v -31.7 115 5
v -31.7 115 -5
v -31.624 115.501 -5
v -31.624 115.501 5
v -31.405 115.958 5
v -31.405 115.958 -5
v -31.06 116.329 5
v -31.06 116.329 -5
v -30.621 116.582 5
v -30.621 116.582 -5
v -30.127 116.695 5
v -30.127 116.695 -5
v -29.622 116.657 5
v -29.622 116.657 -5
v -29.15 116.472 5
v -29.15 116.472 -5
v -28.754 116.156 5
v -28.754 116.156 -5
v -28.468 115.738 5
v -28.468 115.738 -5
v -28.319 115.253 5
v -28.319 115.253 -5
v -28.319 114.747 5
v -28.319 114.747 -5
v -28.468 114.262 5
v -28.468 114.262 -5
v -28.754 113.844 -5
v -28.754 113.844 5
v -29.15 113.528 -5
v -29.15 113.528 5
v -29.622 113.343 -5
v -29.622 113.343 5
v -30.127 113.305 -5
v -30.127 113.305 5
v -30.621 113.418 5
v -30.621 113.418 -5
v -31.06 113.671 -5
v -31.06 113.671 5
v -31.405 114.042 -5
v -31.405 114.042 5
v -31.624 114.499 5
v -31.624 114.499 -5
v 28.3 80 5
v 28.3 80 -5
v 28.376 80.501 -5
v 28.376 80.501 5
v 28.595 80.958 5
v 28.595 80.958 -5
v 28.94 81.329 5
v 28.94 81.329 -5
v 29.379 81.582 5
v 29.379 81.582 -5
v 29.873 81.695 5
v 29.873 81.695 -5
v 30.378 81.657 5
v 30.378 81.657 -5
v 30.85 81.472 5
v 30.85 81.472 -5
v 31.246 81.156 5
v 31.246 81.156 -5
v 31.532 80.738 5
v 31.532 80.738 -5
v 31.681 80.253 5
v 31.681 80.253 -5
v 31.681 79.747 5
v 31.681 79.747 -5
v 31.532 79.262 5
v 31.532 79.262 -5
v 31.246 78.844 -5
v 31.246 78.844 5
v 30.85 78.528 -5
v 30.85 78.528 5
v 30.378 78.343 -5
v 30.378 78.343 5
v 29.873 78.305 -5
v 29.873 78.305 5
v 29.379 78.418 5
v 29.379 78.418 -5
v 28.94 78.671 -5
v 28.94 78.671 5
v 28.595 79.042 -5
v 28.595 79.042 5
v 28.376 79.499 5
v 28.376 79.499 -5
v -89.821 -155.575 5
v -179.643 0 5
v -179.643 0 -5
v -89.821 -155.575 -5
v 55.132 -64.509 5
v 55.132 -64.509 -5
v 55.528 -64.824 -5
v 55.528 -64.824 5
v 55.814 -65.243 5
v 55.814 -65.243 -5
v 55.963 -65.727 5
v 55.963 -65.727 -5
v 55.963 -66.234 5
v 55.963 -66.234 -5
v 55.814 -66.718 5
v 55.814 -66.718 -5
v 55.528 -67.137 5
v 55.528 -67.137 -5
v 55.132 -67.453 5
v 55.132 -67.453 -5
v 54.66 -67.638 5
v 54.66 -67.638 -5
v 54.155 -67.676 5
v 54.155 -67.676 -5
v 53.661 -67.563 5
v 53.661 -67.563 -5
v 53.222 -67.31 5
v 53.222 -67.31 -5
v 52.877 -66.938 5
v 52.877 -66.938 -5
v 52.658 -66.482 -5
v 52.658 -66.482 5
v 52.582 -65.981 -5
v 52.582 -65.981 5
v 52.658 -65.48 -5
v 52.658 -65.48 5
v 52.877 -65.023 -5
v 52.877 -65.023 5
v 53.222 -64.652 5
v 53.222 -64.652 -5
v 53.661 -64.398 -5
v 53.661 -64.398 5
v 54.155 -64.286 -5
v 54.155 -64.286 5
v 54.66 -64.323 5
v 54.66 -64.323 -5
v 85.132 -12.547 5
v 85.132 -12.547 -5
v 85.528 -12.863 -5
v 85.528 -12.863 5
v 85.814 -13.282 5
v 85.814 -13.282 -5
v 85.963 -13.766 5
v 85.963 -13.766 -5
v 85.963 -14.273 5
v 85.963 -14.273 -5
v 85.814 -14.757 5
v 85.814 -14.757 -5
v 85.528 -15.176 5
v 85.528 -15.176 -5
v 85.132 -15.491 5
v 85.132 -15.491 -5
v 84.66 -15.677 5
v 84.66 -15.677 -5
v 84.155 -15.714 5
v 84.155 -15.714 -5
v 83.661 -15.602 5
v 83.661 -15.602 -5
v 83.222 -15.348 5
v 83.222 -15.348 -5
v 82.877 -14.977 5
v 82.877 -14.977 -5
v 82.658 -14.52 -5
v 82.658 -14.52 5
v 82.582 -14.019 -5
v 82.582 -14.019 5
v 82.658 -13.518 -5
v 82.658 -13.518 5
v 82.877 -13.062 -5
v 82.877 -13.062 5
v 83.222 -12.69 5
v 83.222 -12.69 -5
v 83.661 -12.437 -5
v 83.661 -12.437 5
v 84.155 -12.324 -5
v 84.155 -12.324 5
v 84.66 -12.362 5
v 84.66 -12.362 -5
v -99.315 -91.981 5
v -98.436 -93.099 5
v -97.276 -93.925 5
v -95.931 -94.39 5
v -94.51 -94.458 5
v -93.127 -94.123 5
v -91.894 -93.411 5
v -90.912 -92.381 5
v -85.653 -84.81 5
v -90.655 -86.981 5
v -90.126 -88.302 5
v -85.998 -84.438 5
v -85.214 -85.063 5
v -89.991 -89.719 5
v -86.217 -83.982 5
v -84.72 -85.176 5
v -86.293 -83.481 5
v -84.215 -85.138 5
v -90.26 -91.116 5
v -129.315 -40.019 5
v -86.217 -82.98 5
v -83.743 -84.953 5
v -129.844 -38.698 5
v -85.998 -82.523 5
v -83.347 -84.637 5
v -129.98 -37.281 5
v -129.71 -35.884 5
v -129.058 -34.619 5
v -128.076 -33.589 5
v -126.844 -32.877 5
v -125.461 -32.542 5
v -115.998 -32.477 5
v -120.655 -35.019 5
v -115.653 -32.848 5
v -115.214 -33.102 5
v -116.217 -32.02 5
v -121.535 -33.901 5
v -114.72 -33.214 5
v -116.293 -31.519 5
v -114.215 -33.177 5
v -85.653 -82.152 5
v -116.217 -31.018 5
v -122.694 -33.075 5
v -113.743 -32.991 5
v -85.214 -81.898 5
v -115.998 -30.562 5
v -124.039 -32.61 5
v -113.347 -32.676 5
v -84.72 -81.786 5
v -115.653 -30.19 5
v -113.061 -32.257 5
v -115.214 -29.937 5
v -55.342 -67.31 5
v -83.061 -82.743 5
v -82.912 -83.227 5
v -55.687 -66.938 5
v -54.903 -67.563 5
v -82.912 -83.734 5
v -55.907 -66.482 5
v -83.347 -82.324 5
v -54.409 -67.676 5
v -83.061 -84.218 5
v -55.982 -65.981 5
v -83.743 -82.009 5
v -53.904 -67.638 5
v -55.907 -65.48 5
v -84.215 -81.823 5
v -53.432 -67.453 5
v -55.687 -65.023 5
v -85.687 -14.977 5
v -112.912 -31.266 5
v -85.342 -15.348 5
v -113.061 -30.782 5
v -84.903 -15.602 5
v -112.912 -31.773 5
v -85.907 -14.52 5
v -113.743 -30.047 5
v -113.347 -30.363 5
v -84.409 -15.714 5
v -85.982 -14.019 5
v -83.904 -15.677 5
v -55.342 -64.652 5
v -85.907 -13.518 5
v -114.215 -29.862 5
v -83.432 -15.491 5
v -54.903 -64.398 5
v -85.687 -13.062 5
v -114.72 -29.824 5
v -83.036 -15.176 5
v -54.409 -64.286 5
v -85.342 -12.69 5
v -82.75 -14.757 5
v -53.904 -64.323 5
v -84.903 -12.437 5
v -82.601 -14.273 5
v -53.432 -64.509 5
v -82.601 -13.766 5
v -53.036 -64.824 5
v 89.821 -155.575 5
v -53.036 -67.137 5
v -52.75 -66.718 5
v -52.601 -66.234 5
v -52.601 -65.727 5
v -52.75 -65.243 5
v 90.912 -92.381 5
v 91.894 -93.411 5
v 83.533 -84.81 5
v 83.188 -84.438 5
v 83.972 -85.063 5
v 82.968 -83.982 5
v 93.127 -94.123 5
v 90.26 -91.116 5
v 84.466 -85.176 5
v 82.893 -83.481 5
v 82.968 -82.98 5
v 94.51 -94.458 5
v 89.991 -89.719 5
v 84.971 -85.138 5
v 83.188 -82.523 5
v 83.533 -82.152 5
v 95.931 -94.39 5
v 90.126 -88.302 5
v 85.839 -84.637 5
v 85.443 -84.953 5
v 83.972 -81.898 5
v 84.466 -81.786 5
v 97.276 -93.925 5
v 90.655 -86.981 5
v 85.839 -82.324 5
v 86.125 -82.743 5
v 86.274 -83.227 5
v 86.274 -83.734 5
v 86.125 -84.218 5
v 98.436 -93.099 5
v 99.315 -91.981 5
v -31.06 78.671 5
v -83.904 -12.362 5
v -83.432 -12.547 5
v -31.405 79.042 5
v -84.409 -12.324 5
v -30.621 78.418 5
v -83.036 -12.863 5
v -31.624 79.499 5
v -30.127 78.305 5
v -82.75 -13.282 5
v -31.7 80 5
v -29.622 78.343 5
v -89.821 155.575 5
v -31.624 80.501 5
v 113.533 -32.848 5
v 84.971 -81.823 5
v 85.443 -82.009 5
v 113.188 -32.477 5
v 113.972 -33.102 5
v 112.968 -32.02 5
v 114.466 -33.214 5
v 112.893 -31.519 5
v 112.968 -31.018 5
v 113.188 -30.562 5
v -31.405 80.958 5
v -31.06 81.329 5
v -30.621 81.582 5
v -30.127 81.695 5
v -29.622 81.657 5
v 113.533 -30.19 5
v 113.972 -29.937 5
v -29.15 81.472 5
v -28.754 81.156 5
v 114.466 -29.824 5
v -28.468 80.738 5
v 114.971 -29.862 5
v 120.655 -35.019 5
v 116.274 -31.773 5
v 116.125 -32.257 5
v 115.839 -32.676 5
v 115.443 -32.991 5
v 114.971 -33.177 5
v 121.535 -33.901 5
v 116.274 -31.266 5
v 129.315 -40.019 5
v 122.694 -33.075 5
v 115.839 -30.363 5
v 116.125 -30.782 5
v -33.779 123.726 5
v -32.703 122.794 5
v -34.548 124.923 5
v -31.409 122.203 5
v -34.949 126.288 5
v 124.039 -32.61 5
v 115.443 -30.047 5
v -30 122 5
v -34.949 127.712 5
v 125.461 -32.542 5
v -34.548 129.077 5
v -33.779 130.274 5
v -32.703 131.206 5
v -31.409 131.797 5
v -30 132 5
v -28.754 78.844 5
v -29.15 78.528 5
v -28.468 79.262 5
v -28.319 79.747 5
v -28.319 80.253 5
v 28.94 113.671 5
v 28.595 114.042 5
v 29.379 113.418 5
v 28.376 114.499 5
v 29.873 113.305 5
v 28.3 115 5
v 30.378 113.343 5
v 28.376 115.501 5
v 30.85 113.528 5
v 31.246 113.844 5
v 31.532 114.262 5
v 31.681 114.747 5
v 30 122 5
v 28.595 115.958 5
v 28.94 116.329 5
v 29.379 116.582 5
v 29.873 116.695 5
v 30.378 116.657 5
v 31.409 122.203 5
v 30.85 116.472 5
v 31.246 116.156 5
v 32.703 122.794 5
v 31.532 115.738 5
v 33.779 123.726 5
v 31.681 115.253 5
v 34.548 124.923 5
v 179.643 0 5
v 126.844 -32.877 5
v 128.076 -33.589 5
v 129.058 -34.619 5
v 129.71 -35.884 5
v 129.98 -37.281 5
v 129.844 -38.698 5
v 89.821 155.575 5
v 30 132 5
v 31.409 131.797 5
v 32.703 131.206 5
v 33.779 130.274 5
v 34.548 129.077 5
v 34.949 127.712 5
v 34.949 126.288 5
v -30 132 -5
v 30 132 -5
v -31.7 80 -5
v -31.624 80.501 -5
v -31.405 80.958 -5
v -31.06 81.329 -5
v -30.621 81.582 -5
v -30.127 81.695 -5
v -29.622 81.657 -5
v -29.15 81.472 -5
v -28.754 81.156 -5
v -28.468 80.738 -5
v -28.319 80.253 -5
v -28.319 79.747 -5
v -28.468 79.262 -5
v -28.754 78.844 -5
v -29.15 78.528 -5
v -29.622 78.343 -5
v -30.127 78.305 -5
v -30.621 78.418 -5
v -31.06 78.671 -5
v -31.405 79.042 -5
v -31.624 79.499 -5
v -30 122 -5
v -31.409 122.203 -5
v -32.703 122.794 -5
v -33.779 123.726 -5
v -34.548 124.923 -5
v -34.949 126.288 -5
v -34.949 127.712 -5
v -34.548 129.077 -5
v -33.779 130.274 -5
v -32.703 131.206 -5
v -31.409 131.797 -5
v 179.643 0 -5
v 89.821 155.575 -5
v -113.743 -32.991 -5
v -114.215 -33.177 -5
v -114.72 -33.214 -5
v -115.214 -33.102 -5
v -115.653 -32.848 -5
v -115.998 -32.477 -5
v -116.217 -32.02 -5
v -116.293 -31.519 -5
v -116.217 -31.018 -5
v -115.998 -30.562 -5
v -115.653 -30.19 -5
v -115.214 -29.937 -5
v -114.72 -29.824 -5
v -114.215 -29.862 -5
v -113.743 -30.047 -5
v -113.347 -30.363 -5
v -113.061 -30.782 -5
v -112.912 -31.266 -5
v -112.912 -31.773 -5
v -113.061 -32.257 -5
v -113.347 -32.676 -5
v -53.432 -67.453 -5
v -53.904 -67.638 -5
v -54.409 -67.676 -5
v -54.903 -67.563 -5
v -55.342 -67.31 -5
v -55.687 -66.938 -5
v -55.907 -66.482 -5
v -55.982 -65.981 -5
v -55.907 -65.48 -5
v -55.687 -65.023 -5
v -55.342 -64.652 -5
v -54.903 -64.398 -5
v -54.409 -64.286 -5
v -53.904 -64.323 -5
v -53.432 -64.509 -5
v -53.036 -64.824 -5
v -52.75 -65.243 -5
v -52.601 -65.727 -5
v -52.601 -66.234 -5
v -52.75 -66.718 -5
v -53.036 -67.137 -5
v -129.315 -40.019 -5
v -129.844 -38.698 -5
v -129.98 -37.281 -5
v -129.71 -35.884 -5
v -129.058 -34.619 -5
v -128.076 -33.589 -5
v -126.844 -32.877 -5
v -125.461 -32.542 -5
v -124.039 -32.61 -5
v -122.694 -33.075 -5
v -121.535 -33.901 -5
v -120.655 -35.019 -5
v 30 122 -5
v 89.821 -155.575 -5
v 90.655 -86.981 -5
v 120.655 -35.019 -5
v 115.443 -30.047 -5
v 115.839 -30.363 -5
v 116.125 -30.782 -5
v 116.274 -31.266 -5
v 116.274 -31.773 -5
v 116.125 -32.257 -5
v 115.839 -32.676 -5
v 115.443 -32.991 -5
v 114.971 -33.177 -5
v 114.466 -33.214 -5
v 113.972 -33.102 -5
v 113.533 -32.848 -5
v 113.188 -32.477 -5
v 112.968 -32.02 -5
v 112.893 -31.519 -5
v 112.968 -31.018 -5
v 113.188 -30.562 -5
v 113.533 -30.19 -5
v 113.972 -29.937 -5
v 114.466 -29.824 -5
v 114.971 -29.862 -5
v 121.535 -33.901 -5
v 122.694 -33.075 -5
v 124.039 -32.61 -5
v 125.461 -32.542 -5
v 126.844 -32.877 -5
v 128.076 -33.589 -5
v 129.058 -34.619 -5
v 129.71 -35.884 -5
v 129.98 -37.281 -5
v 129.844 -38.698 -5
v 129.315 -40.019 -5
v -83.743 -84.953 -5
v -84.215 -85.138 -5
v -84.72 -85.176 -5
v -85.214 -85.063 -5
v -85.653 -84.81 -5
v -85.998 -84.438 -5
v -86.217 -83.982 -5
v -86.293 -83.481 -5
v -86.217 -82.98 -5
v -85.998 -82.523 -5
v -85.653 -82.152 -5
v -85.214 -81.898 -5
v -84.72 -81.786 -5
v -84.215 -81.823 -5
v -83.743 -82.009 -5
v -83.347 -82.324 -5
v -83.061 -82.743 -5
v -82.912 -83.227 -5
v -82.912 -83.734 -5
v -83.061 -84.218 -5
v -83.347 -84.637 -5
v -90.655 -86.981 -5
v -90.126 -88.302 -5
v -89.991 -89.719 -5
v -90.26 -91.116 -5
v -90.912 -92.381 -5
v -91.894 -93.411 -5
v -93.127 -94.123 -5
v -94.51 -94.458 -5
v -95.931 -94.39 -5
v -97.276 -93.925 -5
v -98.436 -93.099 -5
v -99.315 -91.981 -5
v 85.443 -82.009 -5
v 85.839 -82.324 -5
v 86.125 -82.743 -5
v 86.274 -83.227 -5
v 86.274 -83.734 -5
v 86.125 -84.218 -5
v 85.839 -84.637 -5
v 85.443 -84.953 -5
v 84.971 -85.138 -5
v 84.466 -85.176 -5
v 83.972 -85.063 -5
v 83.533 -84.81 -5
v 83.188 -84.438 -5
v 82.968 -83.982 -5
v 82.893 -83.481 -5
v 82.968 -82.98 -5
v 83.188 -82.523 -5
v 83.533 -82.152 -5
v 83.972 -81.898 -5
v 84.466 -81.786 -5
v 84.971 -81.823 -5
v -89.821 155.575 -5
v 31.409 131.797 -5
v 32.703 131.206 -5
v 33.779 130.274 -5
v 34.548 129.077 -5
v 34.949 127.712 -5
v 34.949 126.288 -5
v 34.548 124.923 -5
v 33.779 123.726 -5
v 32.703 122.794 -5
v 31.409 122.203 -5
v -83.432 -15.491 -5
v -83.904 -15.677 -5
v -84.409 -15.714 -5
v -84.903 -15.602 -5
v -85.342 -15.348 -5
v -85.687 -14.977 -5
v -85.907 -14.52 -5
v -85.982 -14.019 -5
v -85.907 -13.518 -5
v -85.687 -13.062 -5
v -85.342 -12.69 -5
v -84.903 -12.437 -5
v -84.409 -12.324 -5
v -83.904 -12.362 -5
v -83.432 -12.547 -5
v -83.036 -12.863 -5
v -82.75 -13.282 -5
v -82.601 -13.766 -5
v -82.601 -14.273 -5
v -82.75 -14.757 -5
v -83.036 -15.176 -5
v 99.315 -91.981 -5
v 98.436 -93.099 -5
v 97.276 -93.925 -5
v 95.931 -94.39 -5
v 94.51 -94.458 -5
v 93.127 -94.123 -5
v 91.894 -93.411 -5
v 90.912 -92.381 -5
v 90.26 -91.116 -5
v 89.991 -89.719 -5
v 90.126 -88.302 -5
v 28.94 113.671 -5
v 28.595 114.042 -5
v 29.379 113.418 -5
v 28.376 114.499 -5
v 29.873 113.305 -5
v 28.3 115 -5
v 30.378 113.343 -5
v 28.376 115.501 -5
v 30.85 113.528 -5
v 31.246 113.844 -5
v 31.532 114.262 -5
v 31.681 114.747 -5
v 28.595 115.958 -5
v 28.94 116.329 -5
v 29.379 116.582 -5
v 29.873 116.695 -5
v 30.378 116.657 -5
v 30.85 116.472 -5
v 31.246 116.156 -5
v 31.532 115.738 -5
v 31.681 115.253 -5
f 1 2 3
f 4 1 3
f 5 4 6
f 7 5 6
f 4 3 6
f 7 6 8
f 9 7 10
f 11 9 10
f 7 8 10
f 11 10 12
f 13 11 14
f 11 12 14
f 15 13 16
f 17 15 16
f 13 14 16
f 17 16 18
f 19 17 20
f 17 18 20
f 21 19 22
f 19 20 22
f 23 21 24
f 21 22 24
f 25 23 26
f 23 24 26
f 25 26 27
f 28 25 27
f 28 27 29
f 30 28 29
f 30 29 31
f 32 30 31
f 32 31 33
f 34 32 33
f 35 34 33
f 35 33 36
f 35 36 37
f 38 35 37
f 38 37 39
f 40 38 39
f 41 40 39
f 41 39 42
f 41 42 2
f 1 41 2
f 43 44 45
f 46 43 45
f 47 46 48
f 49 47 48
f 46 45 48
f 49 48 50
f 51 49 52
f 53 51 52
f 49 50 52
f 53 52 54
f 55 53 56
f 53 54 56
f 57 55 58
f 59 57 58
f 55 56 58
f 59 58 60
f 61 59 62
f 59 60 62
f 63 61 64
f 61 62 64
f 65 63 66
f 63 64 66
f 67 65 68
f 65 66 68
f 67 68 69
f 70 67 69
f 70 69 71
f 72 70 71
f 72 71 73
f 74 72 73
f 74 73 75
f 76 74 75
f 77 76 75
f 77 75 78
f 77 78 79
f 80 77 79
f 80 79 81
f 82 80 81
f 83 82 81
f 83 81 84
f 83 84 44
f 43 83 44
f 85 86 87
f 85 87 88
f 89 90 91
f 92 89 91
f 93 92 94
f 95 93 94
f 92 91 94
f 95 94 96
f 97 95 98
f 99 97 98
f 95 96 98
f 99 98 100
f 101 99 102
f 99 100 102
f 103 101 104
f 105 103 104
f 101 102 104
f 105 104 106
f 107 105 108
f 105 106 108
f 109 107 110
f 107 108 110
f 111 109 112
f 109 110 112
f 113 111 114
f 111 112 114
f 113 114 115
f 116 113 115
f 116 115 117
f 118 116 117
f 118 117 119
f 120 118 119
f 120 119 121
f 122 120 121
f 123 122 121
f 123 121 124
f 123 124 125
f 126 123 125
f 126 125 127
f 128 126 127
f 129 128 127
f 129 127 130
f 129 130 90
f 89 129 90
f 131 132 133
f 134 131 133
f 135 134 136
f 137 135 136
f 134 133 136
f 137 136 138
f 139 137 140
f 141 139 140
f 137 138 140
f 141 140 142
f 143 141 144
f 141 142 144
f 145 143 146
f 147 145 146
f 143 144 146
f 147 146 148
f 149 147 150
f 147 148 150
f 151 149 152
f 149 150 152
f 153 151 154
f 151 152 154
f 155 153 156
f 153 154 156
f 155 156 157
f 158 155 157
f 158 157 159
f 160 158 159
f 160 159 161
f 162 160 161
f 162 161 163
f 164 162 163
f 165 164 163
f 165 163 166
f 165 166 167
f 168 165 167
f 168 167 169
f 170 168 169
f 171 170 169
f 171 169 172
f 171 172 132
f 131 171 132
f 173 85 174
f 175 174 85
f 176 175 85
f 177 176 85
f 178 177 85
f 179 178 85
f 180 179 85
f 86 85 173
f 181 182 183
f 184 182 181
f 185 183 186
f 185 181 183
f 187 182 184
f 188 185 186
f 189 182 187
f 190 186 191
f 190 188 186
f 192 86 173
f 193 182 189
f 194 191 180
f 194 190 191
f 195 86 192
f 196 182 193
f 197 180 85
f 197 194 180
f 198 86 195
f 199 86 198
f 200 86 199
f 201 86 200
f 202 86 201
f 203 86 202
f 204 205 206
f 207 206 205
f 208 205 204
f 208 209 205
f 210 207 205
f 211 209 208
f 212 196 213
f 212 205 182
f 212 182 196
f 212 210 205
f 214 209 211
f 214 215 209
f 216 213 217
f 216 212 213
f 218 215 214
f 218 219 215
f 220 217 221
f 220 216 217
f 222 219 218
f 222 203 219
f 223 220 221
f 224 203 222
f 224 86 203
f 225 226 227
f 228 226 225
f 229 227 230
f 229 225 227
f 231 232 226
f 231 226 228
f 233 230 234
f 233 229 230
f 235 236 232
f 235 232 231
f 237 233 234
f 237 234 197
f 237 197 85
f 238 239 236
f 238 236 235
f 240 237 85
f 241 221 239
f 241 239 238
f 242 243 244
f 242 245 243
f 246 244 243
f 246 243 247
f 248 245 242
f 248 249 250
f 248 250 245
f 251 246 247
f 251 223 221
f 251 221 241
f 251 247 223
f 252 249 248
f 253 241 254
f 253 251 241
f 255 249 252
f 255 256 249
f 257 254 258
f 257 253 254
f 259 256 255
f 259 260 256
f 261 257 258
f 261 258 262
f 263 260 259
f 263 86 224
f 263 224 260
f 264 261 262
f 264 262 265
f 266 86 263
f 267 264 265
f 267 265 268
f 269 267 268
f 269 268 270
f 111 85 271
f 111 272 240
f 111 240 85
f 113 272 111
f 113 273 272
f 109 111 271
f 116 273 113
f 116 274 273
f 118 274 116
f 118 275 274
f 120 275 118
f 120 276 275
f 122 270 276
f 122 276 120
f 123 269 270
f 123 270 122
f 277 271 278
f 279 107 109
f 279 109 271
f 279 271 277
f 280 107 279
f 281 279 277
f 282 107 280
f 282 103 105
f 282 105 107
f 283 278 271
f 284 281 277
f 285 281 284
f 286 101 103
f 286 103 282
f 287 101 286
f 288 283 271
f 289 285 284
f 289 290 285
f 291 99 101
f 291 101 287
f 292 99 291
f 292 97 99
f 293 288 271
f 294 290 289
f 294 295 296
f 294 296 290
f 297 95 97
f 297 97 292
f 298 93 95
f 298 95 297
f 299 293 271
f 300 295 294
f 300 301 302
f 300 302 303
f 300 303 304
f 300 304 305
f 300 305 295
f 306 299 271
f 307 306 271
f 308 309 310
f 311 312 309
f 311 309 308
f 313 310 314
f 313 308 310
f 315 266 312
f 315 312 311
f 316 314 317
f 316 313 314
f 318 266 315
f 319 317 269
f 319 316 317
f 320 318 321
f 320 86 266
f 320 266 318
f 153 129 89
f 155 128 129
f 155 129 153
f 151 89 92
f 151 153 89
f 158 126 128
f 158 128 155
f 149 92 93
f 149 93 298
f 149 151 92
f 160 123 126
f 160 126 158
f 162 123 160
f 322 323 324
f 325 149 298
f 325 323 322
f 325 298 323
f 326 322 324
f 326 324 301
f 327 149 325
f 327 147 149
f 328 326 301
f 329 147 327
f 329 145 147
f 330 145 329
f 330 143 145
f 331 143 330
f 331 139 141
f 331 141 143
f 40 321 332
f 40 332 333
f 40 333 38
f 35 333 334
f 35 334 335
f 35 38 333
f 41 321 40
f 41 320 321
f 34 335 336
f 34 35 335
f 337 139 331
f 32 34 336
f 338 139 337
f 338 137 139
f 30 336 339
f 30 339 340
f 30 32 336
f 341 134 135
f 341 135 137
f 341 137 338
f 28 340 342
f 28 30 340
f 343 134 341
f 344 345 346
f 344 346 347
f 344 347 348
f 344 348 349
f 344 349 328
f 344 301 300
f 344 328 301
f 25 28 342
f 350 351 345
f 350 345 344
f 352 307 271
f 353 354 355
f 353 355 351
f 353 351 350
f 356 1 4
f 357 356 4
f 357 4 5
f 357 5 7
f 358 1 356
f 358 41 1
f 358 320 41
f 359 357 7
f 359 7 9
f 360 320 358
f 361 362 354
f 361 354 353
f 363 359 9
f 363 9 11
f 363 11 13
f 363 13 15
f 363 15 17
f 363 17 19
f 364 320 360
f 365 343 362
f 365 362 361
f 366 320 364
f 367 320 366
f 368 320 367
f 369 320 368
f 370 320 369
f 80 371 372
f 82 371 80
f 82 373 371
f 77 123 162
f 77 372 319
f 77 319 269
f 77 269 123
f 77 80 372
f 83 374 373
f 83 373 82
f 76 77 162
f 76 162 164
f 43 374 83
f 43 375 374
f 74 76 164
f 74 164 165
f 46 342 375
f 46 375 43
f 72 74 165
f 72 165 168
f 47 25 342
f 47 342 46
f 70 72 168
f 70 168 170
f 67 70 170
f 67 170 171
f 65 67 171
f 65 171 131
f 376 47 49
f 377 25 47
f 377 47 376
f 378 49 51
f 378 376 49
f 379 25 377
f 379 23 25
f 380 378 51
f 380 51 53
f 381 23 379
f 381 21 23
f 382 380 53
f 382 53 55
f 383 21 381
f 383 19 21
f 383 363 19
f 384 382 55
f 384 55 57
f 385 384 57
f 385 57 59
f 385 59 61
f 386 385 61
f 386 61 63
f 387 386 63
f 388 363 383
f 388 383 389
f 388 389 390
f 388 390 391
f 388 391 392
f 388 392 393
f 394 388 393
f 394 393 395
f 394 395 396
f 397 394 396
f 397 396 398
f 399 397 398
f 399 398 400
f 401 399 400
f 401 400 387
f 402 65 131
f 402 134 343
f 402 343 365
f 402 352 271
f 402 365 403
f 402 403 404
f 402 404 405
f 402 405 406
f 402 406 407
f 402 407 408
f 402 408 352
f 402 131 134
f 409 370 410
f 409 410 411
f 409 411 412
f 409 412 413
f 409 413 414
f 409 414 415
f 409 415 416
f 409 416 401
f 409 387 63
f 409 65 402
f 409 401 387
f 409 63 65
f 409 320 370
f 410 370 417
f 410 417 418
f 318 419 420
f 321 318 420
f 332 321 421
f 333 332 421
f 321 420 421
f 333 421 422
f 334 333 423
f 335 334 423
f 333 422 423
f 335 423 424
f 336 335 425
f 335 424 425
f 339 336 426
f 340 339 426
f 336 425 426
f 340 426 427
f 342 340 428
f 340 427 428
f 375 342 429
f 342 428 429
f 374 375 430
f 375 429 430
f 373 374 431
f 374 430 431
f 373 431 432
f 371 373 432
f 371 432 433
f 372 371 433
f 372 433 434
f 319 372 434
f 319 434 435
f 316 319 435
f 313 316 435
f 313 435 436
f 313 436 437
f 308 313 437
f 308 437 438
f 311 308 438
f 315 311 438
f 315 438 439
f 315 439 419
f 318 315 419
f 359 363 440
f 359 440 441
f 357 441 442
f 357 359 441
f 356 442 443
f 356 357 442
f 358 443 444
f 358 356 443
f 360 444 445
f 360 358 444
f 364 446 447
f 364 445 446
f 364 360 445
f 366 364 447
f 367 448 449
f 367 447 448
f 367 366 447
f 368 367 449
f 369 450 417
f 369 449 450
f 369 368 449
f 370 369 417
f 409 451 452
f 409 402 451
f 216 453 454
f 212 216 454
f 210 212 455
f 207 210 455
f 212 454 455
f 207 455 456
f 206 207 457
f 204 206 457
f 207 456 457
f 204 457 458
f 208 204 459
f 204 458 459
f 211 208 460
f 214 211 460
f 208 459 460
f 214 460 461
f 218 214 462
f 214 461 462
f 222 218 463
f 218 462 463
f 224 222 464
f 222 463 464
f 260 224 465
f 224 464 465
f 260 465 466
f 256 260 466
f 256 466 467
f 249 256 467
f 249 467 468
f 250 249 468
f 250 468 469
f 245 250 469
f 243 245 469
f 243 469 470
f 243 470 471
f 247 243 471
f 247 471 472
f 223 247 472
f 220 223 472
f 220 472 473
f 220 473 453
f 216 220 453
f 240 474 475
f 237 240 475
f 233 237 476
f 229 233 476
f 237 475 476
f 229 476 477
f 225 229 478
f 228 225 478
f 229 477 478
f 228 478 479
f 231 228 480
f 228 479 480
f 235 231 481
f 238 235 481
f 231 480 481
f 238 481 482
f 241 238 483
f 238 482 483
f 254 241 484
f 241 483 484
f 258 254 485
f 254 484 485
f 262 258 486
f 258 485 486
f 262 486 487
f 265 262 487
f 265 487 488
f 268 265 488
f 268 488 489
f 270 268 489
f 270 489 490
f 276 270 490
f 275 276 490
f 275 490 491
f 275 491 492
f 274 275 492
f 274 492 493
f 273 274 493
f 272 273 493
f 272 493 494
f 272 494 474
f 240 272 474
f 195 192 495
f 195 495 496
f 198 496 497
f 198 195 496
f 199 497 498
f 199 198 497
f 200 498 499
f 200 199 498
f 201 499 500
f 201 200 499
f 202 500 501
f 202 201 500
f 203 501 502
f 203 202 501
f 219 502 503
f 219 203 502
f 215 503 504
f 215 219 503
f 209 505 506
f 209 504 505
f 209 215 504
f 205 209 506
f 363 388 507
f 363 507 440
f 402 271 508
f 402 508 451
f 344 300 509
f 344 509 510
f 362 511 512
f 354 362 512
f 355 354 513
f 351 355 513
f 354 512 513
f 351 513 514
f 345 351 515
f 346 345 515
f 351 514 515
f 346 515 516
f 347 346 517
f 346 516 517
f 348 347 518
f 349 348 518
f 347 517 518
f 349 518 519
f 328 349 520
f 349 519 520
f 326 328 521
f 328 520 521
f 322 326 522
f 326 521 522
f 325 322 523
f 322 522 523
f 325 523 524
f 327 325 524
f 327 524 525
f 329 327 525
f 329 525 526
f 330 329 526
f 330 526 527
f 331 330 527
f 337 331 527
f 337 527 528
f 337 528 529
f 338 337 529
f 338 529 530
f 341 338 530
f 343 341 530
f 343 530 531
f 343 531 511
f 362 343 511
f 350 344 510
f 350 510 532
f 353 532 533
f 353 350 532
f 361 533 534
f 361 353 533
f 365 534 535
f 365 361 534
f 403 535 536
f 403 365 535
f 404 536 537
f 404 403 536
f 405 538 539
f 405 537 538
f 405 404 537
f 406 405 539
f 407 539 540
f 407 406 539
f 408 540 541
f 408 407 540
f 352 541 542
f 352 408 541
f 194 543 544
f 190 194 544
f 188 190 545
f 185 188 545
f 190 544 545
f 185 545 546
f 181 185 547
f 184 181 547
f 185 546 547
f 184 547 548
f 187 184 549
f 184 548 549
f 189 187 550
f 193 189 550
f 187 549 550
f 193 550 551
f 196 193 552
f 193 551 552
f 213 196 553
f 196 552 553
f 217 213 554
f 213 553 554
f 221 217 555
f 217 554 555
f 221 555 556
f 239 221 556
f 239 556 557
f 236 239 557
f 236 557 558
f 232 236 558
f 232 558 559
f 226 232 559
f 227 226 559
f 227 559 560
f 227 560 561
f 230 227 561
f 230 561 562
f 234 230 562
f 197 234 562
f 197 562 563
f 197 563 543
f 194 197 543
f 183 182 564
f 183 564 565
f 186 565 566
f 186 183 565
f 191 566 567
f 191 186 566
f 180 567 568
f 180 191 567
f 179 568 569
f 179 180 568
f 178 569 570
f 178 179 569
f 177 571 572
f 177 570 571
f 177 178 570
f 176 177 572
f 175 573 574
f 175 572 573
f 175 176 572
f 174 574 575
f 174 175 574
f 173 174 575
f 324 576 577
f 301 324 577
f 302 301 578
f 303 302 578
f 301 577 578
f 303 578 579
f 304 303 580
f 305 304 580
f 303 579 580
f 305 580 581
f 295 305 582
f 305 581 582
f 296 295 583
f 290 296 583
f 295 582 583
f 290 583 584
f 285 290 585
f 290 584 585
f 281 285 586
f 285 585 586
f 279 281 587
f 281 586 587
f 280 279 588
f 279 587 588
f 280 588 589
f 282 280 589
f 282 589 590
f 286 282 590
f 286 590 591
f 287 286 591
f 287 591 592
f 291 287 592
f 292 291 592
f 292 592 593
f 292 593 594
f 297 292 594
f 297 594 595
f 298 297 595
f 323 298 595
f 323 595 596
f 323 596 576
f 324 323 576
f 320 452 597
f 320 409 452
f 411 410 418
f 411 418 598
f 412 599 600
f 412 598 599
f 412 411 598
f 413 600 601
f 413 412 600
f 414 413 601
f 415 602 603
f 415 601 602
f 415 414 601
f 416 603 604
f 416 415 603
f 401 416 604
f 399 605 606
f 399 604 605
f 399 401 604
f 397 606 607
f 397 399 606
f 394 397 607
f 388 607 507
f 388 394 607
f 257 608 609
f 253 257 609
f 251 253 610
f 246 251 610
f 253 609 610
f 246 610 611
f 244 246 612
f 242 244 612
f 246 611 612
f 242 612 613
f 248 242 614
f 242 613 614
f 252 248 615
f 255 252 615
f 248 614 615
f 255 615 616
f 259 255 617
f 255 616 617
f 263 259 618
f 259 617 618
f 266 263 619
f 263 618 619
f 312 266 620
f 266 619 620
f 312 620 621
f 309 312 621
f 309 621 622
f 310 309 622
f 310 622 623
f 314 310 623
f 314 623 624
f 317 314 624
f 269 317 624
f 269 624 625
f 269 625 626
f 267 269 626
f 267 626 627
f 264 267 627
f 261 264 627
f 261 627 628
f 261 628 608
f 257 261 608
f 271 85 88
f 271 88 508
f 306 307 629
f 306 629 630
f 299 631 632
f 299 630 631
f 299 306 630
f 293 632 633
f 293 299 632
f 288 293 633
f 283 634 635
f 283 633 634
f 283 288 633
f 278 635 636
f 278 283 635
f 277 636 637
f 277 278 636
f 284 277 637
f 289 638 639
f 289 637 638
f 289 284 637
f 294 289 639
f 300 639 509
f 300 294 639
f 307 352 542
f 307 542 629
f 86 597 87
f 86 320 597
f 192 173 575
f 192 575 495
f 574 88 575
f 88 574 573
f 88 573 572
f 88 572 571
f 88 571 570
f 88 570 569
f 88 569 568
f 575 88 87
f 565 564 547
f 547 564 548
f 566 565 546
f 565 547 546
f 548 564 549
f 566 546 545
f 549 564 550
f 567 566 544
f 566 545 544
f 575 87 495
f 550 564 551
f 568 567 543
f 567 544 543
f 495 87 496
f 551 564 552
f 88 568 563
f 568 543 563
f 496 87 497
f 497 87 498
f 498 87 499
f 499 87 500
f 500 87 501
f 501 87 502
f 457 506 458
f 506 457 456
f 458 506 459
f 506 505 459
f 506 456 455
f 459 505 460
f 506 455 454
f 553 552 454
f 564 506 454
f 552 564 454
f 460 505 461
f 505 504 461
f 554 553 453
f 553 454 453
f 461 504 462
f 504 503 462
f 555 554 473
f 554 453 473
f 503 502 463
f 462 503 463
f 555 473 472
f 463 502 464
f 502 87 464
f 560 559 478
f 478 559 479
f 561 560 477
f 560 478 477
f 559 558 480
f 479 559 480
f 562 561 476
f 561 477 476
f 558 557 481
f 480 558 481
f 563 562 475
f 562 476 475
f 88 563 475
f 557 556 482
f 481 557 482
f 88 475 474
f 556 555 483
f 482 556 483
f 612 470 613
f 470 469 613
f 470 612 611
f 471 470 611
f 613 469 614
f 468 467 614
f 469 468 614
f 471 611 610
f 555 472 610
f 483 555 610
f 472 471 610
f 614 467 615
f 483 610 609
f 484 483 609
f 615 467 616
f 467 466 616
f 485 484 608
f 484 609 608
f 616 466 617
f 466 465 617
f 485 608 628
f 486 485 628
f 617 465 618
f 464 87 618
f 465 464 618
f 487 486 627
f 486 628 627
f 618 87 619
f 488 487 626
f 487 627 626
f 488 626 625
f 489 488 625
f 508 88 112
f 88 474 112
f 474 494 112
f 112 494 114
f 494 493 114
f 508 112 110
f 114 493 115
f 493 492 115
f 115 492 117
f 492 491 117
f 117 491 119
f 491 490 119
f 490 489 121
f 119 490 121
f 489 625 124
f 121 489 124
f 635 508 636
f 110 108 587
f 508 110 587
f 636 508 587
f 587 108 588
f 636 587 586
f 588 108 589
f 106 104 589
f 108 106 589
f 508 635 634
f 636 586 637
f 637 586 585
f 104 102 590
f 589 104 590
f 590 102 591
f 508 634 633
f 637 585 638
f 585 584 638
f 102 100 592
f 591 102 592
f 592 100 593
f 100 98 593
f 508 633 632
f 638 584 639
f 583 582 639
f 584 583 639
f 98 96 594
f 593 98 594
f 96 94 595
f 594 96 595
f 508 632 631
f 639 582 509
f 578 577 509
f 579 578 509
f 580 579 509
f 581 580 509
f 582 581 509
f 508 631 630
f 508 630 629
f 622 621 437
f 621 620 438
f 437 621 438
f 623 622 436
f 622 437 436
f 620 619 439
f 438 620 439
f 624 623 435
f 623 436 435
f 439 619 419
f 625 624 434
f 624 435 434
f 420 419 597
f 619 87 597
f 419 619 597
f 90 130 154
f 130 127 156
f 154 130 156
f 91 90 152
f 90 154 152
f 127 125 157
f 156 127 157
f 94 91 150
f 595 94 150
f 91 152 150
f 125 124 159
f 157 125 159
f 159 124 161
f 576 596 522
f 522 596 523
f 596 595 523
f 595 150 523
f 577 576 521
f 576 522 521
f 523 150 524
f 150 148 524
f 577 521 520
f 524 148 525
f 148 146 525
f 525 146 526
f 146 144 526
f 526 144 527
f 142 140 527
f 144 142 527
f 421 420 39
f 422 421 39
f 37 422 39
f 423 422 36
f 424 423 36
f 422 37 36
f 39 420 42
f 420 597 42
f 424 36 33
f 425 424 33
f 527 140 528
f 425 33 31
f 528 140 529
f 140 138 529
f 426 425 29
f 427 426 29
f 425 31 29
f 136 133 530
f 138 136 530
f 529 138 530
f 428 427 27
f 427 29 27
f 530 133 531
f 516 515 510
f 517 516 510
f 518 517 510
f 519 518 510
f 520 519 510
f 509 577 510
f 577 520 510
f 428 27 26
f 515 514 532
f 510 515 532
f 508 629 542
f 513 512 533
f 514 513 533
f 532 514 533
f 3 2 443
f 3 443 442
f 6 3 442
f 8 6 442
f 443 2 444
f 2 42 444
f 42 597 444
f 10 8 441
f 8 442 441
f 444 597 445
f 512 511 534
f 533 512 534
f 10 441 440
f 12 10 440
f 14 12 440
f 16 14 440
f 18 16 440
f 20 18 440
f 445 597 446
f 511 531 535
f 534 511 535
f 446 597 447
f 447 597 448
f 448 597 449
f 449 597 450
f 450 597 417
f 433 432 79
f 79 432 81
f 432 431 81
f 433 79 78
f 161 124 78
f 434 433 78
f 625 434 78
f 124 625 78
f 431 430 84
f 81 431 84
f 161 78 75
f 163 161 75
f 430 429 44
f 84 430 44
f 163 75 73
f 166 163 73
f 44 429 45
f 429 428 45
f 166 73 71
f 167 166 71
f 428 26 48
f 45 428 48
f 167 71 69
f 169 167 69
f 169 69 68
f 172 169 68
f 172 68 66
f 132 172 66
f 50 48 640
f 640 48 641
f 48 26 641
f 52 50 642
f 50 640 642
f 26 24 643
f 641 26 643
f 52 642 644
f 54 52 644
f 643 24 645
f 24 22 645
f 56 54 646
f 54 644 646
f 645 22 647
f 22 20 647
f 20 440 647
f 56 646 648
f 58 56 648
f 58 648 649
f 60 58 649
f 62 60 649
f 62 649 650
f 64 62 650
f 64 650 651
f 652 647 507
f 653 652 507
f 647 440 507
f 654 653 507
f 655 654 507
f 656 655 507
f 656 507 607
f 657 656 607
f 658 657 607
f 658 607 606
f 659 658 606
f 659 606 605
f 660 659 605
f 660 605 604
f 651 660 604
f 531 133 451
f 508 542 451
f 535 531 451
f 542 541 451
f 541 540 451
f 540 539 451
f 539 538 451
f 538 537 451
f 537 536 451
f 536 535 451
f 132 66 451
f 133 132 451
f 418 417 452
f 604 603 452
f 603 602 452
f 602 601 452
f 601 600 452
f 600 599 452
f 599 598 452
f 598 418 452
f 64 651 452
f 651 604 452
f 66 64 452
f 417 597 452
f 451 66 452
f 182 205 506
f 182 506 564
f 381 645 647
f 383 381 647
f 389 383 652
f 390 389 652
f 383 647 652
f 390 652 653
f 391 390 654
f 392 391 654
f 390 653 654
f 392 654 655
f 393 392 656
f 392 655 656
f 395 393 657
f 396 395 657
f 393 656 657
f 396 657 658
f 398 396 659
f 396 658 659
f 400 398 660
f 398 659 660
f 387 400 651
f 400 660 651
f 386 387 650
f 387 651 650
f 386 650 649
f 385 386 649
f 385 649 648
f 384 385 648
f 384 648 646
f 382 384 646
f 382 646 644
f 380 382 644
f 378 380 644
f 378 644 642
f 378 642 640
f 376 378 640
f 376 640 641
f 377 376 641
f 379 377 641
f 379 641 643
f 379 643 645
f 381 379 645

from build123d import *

# Parameters (mm, degrees)
BOSS_EXTRUDE1_DEPTH  = 5
CUT_EXTRUDE1_DEPTH   = 238.855042953
M3_CLEARANCE_HOLE1_D = 3.4
CIRPATTERN1_COUNT    = 3


with BuildPart() as part:
    # Sketch2 → Boss-Extrude1 (new, symmetric)
    with BuildSketch(Plane.XY):
        Polygon((-89.821268129, 155.575), (-179.642536258, 0), (-89.821268129, -155.575), (89.821268129, -155.575), (179.642536258, 0), (89.821268129, 155.575), align=None)
    extrude(amount=BOSS_EXTRUDE1_DEPTH, both=True)

    # Sketch3 → Cut-Extrude1 (cut, through all)
    with BuildSketch(Plane.XY.offset(5)):
        with BuildLine():
            Line((-29.999999999, 132), (30.000000001, 132))
            ThreePointArc((30.000000001, 132), (35.000000001, 127), (30.000000001, 122))
            Line((30.000000001, 122), (-29.999999999, 122))
            ThreePointArc((-29.999999999, 122), (-34.999999999, 127), (-29.999999999, 132))
        make_face()
    cut_extrude1 = extrude(amount=-CUT_EXTRUDE1_DEPTH, mode=Mode.SUBTRACT)

    # M3 Clearance Hole1 (through all)
    with Locations(Plane.XY.offset(5)):
        with Locations((-30.000000001, 115), (30.000000001, 115), (-30.000000001, 80), (30.000000001, 80)):
            m3_clearance_hole1 = Hole(M3_CLEARANCE_HOLE1_D / 2)

    # CirPattern1: Cut-Extrude1, M3 Clearance Hole1 ×3 about axis
    cirpattern1_axis = Axis((0, 0, -20.250000596), (0, 0, 1))
    add([cut_extrude1.rotate(cirpattern1_axis, i * 360 / CIRPATTERN1_COUNT) for i in range(1, CIRPATTERN1_COUNT)], mode=Mode.SUBTRACT)
    add([m3_clearance_hole1.rotate(cirpattern1_axis, i * 360 / CIRPATTERN1_COUNT) for i in range(1, CIRPATTERN1_COUNT)], mode=Mode.SUBTRACT)


solid = part.part
